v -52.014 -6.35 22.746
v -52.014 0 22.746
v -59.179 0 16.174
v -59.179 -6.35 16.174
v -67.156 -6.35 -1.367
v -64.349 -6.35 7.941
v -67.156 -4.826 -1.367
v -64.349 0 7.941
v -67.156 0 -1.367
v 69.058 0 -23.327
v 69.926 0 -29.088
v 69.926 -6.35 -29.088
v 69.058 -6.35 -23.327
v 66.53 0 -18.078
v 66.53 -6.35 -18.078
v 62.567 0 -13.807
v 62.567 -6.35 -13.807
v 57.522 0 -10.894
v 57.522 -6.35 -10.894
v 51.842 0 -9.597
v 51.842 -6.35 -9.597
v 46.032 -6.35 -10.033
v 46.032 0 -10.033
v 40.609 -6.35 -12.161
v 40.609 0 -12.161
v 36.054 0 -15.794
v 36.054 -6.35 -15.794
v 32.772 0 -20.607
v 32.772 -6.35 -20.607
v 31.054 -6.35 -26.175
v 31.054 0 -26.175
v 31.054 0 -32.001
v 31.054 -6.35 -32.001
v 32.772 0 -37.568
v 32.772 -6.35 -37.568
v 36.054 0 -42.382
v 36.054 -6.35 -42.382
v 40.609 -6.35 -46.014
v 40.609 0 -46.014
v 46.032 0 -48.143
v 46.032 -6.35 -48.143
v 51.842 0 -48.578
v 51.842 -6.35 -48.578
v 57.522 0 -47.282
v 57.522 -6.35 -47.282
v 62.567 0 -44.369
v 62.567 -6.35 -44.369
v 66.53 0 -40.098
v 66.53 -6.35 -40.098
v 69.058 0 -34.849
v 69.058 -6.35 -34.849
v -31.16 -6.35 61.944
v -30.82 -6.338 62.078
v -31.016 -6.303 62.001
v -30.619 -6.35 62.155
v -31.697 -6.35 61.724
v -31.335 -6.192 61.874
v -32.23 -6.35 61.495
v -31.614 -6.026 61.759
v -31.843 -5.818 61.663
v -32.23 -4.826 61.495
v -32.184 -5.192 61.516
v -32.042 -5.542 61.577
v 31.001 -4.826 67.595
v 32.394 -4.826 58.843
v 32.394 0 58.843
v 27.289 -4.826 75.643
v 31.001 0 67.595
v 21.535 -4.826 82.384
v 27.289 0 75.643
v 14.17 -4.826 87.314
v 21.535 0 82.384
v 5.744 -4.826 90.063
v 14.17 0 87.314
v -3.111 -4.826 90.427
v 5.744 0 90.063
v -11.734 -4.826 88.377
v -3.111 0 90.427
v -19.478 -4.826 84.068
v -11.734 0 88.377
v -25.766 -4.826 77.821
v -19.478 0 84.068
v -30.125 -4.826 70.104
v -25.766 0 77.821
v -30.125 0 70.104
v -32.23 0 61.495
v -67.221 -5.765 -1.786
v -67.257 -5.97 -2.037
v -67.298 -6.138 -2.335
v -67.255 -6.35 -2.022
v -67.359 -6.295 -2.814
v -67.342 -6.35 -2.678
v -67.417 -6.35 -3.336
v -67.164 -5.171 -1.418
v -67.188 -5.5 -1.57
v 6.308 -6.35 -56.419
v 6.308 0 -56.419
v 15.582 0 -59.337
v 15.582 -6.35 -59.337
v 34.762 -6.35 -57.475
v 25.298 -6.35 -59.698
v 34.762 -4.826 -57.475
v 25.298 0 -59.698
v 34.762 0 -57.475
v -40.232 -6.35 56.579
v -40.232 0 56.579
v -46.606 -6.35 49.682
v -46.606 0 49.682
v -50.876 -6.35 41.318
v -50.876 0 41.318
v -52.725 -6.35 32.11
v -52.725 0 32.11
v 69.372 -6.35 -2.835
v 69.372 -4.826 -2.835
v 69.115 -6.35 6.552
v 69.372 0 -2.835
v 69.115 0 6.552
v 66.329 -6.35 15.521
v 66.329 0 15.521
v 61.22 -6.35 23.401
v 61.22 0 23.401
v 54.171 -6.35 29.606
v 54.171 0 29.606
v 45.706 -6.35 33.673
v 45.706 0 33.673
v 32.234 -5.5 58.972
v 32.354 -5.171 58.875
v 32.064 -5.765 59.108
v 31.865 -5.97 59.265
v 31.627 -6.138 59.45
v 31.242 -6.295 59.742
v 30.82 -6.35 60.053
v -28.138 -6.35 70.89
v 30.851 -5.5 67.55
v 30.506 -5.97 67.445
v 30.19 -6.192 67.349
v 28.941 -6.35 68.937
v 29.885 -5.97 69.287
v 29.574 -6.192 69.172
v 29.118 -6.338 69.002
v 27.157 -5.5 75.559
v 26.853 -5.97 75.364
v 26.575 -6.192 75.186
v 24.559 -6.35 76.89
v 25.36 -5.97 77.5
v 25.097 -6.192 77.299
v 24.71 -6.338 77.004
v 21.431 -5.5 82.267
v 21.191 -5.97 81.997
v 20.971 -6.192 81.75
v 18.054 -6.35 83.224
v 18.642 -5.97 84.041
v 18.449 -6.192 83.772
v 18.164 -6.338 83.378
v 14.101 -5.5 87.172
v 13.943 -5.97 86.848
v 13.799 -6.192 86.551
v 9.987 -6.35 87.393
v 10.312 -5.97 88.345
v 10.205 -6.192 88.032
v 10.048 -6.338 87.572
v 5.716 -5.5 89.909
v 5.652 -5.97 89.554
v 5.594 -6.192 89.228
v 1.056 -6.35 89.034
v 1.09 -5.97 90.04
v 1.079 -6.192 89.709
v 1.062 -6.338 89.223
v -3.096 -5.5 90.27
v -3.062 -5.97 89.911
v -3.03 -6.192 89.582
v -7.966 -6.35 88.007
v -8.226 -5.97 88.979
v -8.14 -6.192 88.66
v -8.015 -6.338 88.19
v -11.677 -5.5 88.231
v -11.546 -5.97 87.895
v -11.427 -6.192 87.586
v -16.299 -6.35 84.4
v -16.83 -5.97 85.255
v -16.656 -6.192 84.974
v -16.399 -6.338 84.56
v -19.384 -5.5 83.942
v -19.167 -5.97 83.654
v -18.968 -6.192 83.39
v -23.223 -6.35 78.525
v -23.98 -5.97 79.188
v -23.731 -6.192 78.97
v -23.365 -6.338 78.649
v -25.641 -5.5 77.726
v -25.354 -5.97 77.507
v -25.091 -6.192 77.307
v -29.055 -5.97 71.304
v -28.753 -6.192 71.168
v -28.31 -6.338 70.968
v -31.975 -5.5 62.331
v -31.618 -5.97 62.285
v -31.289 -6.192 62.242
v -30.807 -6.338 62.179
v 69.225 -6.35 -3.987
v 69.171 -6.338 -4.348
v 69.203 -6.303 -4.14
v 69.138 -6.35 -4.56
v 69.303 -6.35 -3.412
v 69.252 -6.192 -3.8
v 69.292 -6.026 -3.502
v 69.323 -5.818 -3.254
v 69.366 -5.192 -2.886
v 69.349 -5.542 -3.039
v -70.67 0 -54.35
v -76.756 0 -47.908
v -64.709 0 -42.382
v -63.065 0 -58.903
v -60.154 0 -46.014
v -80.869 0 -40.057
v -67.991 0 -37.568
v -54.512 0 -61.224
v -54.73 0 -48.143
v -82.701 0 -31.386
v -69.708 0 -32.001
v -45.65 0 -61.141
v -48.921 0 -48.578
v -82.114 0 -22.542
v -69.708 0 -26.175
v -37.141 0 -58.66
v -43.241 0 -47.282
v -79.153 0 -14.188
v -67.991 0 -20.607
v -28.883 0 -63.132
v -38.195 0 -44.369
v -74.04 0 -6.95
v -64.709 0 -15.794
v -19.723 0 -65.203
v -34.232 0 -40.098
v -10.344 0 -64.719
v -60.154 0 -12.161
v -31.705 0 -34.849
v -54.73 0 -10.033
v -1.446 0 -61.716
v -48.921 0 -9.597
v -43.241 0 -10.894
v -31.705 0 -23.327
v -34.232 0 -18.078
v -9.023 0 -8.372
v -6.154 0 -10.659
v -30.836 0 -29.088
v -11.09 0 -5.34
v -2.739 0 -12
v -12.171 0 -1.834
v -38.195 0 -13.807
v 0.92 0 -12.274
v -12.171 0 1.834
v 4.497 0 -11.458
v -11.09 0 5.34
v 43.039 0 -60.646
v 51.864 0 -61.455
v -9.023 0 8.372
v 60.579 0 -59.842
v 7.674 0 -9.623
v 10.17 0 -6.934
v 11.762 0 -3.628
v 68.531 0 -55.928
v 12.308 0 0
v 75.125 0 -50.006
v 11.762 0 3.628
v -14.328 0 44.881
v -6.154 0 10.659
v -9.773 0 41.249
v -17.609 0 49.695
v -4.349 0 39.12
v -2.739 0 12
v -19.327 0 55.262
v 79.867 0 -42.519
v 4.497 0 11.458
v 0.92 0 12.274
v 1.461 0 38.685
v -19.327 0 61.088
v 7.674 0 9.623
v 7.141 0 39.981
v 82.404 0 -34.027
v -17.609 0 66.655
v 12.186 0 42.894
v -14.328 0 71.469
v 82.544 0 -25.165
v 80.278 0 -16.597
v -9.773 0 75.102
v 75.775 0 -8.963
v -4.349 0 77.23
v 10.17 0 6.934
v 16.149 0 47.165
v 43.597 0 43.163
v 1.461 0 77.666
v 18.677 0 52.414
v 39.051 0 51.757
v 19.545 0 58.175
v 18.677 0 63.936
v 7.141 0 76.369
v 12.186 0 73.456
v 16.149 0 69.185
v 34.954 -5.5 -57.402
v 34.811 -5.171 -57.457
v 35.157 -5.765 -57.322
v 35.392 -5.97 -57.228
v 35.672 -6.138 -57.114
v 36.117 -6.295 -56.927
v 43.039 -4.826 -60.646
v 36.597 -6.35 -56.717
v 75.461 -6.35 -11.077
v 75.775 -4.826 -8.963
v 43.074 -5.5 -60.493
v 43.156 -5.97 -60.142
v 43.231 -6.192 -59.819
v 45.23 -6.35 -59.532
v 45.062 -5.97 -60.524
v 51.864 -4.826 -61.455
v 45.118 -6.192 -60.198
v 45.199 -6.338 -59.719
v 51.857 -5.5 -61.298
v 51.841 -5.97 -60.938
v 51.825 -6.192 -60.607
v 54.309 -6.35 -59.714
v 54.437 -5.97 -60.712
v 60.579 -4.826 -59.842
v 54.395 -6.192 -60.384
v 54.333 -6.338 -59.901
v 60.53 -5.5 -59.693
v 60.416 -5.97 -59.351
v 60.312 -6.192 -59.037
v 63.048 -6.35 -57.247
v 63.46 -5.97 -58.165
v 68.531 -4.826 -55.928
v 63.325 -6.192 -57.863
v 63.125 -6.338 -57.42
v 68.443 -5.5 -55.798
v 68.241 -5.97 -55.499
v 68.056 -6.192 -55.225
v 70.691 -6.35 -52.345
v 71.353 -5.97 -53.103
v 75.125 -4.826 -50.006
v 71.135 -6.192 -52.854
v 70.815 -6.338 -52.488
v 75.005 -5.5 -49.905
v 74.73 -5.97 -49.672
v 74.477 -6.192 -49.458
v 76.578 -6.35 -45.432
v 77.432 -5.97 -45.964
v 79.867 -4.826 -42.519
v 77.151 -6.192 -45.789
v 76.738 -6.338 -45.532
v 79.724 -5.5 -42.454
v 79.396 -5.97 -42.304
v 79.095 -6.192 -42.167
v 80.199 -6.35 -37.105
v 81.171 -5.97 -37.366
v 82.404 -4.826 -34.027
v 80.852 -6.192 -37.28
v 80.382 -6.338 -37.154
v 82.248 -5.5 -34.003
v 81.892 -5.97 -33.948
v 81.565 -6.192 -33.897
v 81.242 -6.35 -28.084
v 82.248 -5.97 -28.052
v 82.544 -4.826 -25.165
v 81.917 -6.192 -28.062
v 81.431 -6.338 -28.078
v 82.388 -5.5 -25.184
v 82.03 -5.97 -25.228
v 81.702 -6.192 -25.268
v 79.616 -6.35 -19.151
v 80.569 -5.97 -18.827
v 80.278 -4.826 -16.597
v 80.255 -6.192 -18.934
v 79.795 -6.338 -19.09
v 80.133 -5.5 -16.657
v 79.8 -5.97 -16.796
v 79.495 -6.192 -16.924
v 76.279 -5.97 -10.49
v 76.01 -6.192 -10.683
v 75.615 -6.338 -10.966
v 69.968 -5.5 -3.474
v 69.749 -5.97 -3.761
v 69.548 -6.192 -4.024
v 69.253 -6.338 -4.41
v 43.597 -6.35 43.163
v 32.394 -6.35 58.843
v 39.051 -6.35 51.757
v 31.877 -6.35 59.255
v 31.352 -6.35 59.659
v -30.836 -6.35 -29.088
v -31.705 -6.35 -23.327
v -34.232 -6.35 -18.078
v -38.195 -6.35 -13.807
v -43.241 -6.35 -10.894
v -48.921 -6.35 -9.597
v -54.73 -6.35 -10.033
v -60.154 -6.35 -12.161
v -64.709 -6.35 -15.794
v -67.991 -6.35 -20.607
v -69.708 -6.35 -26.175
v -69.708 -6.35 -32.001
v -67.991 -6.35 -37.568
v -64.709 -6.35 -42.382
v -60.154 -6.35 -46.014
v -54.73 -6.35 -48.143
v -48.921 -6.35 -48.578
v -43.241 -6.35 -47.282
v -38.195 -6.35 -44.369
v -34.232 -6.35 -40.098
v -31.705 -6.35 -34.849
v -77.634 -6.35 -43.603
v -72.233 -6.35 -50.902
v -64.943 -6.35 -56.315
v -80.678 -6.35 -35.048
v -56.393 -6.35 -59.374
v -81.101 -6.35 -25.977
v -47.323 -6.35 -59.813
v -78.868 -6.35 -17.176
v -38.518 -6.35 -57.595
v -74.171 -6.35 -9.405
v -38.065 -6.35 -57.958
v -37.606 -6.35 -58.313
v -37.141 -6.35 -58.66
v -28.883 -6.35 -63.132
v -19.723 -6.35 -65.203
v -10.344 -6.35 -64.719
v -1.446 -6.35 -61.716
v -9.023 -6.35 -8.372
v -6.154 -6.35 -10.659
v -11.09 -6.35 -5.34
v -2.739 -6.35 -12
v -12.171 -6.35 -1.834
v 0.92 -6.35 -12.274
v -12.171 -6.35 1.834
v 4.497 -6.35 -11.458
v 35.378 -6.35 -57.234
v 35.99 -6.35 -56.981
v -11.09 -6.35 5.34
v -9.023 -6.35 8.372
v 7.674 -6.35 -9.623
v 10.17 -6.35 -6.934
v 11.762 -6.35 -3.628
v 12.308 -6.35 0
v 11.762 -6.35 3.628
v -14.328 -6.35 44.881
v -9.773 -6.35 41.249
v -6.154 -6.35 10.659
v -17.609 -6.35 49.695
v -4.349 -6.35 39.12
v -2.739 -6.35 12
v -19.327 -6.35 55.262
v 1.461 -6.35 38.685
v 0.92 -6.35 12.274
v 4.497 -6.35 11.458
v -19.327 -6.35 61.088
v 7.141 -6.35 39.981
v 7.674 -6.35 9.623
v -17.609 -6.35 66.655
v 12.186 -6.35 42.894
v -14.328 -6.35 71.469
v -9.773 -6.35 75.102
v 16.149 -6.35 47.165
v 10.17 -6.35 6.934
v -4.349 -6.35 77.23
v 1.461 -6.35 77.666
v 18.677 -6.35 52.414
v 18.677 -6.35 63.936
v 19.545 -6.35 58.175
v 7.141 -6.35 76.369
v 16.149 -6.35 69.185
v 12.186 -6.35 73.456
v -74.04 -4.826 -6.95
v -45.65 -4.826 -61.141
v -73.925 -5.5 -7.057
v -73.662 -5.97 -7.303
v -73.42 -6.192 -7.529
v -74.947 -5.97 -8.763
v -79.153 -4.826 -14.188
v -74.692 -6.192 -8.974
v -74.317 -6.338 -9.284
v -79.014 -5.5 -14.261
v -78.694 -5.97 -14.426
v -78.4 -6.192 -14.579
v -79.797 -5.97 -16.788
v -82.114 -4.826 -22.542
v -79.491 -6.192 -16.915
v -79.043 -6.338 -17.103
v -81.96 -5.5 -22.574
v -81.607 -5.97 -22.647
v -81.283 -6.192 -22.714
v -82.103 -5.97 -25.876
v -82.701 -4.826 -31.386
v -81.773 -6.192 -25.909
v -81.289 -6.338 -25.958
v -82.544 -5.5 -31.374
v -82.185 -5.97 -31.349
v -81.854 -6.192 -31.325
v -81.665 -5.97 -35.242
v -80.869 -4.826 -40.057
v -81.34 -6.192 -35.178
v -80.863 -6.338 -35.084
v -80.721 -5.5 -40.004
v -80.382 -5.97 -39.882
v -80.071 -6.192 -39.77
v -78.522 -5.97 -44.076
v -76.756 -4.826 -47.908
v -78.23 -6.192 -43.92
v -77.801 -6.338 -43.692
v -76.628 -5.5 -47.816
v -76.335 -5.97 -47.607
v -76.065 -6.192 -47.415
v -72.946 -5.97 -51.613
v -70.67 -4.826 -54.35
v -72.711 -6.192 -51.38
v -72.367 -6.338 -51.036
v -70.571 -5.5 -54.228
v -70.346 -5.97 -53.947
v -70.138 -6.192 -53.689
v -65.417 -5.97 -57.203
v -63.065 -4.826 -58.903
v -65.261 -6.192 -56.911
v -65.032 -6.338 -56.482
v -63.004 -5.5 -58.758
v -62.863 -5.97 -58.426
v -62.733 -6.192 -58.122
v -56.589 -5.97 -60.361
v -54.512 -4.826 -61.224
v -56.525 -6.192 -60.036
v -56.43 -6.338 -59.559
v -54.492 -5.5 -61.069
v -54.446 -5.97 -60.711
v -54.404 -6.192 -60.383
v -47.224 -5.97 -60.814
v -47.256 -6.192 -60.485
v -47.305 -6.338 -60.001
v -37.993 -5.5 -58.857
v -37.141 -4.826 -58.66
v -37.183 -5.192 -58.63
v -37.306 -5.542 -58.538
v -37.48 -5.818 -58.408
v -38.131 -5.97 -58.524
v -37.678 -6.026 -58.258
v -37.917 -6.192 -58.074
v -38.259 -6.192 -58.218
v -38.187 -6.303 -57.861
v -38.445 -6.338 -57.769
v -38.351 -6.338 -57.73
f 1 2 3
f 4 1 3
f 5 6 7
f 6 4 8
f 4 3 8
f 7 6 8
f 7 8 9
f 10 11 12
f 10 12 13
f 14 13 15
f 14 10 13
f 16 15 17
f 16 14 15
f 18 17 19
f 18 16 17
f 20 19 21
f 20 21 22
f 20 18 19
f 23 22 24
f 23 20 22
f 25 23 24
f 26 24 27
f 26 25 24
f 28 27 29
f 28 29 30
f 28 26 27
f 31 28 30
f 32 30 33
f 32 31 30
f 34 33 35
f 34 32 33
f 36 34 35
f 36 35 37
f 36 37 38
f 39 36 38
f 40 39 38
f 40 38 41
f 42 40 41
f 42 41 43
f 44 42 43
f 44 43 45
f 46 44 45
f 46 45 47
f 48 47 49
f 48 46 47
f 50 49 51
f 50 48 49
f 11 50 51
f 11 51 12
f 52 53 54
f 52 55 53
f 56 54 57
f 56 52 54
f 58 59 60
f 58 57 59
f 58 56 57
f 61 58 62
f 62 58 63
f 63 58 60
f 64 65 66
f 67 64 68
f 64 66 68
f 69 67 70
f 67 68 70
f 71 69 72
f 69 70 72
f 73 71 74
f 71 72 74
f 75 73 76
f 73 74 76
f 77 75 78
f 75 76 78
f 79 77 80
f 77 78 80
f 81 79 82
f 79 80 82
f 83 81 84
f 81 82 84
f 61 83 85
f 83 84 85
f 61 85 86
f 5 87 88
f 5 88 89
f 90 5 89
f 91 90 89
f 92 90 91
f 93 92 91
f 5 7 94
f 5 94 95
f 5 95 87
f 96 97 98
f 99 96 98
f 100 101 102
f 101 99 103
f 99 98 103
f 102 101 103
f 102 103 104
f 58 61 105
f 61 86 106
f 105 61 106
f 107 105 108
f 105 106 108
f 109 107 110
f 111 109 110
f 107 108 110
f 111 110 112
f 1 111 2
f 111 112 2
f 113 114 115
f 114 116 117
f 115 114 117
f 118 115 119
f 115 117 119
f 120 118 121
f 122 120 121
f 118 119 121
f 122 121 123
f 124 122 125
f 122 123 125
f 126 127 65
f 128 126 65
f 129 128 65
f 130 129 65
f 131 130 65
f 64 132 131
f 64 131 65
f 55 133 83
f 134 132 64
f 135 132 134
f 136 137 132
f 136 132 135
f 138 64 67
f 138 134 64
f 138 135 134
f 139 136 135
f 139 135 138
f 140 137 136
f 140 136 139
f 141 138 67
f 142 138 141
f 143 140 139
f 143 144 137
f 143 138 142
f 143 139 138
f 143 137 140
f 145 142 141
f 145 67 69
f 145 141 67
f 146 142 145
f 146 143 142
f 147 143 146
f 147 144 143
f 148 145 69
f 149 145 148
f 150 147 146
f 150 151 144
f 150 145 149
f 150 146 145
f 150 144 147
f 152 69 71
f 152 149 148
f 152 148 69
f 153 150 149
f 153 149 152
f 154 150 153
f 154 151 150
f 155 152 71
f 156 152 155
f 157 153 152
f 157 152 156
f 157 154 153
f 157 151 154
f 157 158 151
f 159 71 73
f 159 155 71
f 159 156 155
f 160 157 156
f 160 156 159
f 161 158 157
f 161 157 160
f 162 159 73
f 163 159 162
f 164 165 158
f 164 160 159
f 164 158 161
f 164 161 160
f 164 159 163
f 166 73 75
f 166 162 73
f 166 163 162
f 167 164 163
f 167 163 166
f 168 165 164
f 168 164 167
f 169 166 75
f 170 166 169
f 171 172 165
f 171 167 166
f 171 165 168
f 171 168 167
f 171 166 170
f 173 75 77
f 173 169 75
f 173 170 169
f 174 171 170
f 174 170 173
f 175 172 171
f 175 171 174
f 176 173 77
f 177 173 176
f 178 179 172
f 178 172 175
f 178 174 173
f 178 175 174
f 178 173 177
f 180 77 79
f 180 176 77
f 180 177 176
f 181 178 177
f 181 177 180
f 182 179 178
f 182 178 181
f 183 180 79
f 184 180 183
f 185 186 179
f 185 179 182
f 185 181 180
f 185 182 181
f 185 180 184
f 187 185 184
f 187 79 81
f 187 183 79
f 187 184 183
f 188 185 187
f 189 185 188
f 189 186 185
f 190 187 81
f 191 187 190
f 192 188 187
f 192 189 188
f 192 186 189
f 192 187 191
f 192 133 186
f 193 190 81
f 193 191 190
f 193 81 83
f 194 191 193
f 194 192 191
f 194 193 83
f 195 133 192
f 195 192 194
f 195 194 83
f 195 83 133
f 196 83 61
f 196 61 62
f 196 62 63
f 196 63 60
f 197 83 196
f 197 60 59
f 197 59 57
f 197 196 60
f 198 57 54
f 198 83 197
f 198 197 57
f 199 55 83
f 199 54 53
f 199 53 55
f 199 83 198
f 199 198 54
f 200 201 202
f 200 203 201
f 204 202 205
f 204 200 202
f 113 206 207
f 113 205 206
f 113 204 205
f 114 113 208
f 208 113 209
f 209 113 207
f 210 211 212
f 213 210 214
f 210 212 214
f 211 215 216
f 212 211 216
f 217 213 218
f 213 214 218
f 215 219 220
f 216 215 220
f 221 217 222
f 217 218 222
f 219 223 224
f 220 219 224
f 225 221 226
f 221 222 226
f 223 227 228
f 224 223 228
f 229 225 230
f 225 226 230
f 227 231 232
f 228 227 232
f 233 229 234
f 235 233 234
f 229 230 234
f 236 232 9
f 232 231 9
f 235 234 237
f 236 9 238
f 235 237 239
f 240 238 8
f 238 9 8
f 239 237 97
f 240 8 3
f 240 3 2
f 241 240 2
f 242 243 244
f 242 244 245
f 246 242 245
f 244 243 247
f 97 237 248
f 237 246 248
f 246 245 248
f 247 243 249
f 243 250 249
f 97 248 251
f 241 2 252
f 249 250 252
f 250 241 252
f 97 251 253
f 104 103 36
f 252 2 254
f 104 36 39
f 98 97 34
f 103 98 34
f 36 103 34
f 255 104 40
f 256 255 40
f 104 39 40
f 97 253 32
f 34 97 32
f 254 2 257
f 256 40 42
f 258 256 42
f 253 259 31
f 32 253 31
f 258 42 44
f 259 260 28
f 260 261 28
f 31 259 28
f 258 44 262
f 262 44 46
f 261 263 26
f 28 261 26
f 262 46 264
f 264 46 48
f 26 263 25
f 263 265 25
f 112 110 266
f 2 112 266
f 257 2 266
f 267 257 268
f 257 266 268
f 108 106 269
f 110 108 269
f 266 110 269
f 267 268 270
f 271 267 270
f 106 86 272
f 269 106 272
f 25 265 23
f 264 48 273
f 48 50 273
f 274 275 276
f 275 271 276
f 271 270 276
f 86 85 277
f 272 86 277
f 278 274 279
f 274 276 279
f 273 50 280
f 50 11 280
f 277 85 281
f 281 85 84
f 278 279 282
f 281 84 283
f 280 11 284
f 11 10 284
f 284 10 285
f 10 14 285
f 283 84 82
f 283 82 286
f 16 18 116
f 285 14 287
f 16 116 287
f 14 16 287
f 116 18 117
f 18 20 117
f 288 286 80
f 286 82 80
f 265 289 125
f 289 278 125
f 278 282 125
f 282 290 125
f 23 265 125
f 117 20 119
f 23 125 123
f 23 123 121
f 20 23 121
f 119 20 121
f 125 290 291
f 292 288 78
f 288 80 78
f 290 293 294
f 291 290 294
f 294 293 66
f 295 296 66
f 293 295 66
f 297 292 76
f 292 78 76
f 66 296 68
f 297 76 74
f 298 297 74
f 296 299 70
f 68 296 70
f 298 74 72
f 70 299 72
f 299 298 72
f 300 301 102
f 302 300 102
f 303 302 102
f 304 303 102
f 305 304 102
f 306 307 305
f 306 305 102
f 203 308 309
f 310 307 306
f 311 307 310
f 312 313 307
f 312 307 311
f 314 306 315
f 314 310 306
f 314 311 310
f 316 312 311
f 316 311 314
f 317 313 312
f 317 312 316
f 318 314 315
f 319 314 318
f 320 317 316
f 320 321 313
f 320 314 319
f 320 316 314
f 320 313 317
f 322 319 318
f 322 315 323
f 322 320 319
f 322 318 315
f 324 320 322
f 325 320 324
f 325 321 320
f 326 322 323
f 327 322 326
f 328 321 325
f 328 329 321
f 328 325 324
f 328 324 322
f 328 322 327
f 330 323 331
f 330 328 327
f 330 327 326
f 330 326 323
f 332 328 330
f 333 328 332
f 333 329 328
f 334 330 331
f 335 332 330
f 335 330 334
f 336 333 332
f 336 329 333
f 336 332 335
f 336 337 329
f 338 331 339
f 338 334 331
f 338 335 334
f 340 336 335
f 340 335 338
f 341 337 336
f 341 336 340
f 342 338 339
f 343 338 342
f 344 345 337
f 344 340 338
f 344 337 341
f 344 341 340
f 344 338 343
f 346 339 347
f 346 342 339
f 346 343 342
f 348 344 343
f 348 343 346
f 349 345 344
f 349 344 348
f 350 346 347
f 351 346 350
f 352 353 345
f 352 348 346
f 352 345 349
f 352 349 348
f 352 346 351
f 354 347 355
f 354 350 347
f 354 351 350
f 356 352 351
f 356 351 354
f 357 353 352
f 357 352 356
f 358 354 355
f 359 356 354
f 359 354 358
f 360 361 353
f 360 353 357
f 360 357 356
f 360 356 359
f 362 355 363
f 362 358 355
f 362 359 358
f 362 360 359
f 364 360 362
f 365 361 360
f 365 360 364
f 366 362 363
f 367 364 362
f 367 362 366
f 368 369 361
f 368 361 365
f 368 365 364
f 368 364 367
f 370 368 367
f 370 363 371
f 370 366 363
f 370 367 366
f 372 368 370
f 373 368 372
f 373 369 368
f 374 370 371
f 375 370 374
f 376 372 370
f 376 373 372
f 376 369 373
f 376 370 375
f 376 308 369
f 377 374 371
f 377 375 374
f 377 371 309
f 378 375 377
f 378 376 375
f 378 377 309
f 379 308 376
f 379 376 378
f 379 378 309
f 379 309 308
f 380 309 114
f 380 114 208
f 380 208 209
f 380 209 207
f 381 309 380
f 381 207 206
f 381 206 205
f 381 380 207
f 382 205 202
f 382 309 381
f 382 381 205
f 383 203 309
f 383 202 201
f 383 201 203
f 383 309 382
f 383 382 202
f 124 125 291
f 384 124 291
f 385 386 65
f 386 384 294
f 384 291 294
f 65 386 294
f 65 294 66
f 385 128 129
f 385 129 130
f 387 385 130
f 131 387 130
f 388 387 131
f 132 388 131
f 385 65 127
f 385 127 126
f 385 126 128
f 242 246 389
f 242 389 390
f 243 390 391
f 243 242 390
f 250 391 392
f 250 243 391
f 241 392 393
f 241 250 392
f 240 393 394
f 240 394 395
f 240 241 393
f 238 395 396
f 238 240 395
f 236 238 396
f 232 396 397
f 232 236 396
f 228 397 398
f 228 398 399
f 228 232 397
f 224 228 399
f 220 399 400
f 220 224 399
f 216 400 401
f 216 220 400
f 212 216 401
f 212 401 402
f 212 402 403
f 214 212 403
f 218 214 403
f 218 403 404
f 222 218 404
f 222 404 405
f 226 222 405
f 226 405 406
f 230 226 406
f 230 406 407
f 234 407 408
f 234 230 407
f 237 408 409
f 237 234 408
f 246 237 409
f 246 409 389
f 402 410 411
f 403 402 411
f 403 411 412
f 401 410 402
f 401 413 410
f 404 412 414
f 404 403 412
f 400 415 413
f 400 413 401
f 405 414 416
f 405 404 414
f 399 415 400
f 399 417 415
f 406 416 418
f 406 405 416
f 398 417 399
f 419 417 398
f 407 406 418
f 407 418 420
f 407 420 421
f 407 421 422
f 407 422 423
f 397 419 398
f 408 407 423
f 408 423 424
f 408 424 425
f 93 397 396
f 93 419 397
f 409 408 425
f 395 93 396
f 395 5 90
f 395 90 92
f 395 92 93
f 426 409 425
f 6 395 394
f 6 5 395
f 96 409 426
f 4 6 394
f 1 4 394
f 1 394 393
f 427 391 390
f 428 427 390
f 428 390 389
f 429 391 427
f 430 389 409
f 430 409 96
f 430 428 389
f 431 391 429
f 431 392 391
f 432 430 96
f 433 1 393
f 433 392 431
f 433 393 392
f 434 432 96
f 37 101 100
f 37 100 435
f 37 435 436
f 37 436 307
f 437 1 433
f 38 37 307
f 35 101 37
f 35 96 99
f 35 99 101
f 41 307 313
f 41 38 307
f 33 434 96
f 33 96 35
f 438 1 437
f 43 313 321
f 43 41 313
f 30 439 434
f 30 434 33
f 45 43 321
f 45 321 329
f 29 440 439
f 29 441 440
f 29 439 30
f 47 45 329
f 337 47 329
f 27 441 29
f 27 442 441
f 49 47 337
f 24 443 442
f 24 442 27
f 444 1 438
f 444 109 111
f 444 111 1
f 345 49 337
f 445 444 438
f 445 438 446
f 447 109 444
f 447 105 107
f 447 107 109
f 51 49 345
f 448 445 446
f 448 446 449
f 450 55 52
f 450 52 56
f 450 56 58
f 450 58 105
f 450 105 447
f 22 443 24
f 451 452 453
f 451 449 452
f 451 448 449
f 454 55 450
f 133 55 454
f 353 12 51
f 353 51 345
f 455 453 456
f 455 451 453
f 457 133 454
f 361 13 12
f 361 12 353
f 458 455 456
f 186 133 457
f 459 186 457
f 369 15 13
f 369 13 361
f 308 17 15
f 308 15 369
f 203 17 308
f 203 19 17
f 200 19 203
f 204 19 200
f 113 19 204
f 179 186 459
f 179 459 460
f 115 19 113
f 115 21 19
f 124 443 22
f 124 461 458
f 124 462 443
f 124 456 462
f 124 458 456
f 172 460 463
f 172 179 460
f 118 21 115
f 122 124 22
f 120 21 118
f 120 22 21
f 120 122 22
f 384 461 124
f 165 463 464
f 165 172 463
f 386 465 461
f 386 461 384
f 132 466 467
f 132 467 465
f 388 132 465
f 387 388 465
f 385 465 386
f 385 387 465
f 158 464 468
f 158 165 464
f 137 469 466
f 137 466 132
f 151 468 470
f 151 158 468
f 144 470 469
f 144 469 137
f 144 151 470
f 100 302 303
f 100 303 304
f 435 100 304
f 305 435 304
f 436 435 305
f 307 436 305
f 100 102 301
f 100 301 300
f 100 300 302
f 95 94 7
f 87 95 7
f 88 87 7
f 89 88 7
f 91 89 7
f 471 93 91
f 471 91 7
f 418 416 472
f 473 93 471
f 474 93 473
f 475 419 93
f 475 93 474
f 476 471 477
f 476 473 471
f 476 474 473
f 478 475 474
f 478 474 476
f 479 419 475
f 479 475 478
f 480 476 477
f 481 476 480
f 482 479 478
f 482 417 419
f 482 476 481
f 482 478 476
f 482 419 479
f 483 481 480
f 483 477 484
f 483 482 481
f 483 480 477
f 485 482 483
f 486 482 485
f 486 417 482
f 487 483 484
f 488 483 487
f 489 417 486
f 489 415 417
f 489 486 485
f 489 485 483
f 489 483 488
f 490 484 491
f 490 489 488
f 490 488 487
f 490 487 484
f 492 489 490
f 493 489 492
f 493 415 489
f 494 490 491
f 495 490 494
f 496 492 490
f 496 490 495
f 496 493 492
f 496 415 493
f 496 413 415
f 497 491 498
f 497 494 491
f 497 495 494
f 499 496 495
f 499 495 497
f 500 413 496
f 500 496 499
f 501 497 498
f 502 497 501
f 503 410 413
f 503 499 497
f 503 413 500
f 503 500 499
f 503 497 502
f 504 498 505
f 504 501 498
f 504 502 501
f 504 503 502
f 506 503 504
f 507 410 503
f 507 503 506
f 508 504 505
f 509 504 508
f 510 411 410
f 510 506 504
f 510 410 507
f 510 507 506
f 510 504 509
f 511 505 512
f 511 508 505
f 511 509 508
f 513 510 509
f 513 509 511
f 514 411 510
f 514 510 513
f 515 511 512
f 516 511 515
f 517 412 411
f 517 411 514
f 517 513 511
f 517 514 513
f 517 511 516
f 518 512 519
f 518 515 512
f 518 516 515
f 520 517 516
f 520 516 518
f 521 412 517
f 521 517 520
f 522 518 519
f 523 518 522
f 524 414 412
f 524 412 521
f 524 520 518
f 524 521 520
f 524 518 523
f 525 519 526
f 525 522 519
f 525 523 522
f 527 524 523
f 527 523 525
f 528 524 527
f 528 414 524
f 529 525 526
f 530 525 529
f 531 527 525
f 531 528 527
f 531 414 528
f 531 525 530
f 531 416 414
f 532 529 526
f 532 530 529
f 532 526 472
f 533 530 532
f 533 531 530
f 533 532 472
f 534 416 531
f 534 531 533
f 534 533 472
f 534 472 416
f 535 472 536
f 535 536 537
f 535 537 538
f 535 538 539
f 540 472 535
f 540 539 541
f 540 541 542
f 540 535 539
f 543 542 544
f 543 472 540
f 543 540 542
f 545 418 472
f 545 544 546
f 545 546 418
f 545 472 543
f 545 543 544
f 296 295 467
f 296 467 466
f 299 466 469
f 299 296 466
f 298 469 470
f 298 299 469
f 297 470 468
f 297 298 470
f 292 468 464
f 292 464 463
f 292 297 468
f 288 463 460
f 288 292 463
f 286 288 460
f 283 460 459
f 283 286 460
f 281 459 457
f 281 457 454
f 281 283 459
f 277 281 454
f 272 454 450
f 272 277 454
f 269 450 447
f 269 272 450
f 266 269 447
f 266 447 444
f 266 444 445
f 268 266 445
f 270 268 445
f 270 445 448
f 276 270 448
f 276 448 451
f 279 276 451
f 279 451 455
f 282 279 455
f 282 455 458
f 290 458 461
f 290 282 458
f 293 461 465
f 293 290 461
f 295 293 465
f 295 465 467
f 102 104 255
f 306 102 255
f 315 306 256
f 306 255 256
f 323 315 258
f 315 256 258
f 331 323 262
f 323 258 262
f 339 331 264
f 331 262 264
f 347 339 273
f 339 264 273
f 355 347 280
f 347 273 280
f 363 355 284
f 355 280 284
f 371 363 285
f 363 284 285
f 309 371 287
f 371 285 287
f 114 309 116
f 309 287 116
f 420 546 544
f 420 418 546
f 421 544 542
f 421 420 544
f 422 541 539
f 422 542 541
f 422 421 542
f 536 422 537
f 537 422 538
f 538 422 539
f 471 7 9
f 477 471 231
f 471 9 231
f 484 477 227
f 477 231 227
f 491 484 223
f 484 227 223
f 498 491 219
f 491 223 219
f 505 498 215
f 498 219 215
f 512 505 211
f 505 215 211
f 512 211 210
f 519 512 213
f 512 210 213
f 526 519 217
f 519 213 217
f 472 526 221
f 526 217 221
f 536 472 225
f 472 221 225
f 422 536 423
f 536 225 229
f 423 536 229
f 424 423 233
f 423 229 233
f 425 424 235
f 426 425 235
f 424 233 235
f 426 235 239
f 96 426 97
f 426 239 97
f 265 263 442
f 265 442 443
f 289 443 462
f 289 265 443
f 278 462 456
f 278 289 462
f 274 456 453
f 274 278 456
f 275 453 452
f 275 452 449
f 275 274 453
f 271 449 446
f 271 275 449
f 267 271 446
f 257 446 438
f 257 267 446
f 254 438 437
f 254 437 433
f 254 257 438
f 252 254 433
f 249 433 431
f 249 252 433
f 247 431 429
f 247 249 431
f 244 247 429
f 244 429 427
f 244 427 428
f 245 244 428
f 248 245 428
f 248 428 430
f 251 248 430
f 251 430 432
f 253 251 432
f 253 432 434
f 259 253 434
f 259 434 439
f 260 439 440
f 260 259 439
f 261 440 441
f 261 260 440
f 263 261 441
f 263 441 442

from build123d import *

# Parameters (mm, degrees)
F0_R         = 19.5450228134
F0_R_2       = 12.3084359059
F1_DEPTH     = 6.35
F2_T4_ANGLE  = 186.4329686672
F2_S5_R      = 36.413303104
F2_T6_DEPTH  = 41
F2_S7_R      = 34.3943026377
F2_T8_DEPTH  = 41
F2_T12_ANGLE = 186.4329686672
F2_S13_R     = 36.413303104
F2_T14_DEPTH = 44
F2_S15_R     = 34.3943026377
F2_T16_DEPTH = 44
F2_T20_ANGLE = 186.4329686672
F2_S21_R     = 36.413303104
F2_T22_DEPTH = 43
F2_S23_R     = 34.3943026377
F2_T24_DEPTH = 43


# Not quite as in the source:
# - a fillet or chamfer that OpenCascade refuses, or shapes differently, is made with other operations: its cross-section is extruded or revolved along the edge and cut away or added


with BuildPart() as f1:
    # F0 (on Front) → F1 (new body)
    with BuildSketch(Plane.XZ):
        with BuildLine():
            ThreePointArc((45.7058369334, 33.6726559303), (41.6121725533, 47.6126804082), (32.3941794324, 58.8425946254))
            ThreePointArc((32.3941794324, 58.8425946254), (1.3289124245, 90.5489995431), (-32.2304944376, 61.495374328))
            ThreePointArc((-32.2304944376, 61.495374328), (-49.0277697558, 45.6463332306), (-52.0142939153, 22.7460879204))
            ThreePointArc((-52.0142939153, 22.7460879204), (-62.0398770524, 12.2308583337), (-67.1562714864, -1.3671149894))
            ThreePointArc((-67.1562714864, -1.3671149894), (-79.0821901038, -44.1236278525), (-37.1413091645, -58.6601141235))
            ThreePointArc((-37.1413091645, -58.6601141235), (-15.0169992894, -65.2824607147), (6.3084569819, -56.4187438507))
            ThreePointArc((6.3084569819, -56.4187438507), (20.4277044991, -59.8435387419), (34.7620920539, -57.4754796359))
            ThreePointArc((34.7620920539, -57.4754796359), (77.7532776793, -46.4253716906), (69.3718036021, -2.8352602045))
            ThreePointArc((69.3718036021, -2.8352602045), (64.0447690452, 19.6361274841), (45.7058369334, 33.6726559303))
        make_face()
        with Locations((-50.3812096523, -29.0876049548)):
            Circle(F0_R, mode=Mode.SUBTRACT)
        with Locations((50.3812096523, -29.0876049548)):
            Circle(F0_R, mode=Mode.SUBTRACT)
        Circle(F0_R_2, mode=Mode.SUBTRACT)
        with Locations((0, 58.1752099097)):
            Circle(F0_R, mode=Mode.SUBTRACT)
    extrude(amount=F1_DEPTH)

    # F2: fillet of radius 1.524 on 3 edges, made by hand


with BuildPart() as f2_tool2:
    # F2_s3 → F2_t4 (revolve)
    with BuildSketch(Plane(origin=(5.6170399672, 0, 57.627710491), x_dir=(0, 1, 0), z_dir=(-0.0970114178, 0, -0.9952832686))):
        with BuildLine():
            ThreePointArc((-4.826, 26.7573938379), (-5.9036307345, 26.3110245724), (-6.35, 25.2333938379))
            Line((-6.35, 25.2333938379), (-6.35, 26.7573938379))
            Line((-6.35, 26.7573938379), (-4.826, 26.7573938379))
        make_face()
    revolve(axis=Axis((0, -6.35, 58.1752099097), (0, -1, 0)), revolution_arc=F2_T4_ANGLE)

    # F2_s5 → F2_t6 (cut, symmetric)
    with BuildSketch(Plane.XZ.offset(5.6)):
        with Locations((9.423343912, 30.5889336513)):
            Circle(F2_S5_R)
    extrude(amount=F2_T6_DEPTH, both=True, mode=Mode.SUBTRACT)

    # F2_s7 → F2_t8 (cut, symmetric)
    with BuildSketch(Plane.XZ.offset(5.6)):
        with Locations((-18.3950397685, 30.0065152183)):
            Circle(F2_S7_R)
    extrude(amount=F2_T8_DEPTH, both=True, mode=Mode.SUBTRACT)


with BuildPart() as f1_1:
    add(f1.part)

    # F2_t1: cut F2_tool2
    add(f2_tool2.part, mode=Mode.SUBTRACT)


with BuildPart() as f2_tool10:
    # F2_s11 → F2_t12 (revolve)
    with BuildSketch(Plane(origin=(47.0985412635, 0, -33.6783545512), x_dir=(0, 1, 0), z_dir=(-0.8134348857, 0, 0.5816559866))):
        with BuildLine():
            ThreePointArc((-4.826, 26.7573938379), (-5.9036307345, 26.3110245724), (-6.35, 25.2333938379))
            Line((-6.35, 25.2333938379), (-6.35, 26.7573938379))
            Line((-6.35, 26.7573938379), (-4.826, 26.7573938379))
        make_face()
    revolve(axis=Axis((50.3812096523, -6.35, -29.0876049548), (0, -1, 0)), revolution_arc=F2_T12_ANGLE)

    # F2_s13 → F2_t14 (cut, symmetric)
    with BuildSketch(Plane.XZ.offset(5.6)):
        with Locations((21.7791216607, -23.4553220421)):
            Circle(F2_S13_R)
    extrude(amount=F2_T14_DEPTH, both=True, mode=Mode.SUBTRACT)

    # F2_s15 → F2_t16 (cut, symmetric)
    with BuildSketch(Plane.XZ.offset(5.6)):
        with Locations((35.1839243423, 0.927314134)):
            Circle(F2_S15_R)
    extrude(amount=F2_T16_DEPTH, both=True, mode=Mode.SUBTRACT)


with BuildPart() as f1_2:
    add(f1_1.part)

    # F2_t9: cut F2_tool10
    add(f2_tool10.part, mode=Mode.SUBTRACT)


with BuildPart() as f2_tool18:
    # F2_s19 → F2_t20 (revolve)
    with BuildSketch(Plane(origin=(-52.7155812308, 0, -23.9493559398), x_dir=(0, 1, 0), z_dir=(0.9104463035, 0, 0.4136272821))):
        with BuildLine():
            ThreePointArc((-4.826, 26.7573938379), (-5.9036307345, 26.3110245724), (-6.35, 25.2333938379))
            Line((-6.35, 25.2333938379), (-6.35, 26.7573938379))
            Line((-6.35, 26.7573938379), (-4.826, 26.7573938379))
        make_face()
    revolve(axis=Axis((-50.3812096523, -6.35, -29.0876049548), (0, -1, 0)), revolution_arc=F2_T20_ANGLE)

    # F2_s21 → F2_t22 (cut, symmetric)
    with BuildSketch(Plane.XZ.offset(5.6)):
        with Locations((-31.2024655727, -7.1336116092)):
            Circle(F2_S21_R)
    extrude(amount=F2_T22_DEPTH, both=True, mode=Mode.SUBTRACT)

    # F2_s23 → F2_t24 (cut, symmetric)
    with BuildSketch(Plane.XZ.offset(5.6)):
        with Locations((-16.7888845738, -30.9338293523)):
            Circle(F2_S23_R)
    extrude(amount=F2_T24_DEPTH, both=True, mode=Mode.SUBTRACT)


with BuildPart() as f1_3:
    add(f1_2.part)

    # F2_t17: cut F2_tool18
    add(f2_tool18.part, mode=Mode.SUBTRACT)


solid = f1_3.part
